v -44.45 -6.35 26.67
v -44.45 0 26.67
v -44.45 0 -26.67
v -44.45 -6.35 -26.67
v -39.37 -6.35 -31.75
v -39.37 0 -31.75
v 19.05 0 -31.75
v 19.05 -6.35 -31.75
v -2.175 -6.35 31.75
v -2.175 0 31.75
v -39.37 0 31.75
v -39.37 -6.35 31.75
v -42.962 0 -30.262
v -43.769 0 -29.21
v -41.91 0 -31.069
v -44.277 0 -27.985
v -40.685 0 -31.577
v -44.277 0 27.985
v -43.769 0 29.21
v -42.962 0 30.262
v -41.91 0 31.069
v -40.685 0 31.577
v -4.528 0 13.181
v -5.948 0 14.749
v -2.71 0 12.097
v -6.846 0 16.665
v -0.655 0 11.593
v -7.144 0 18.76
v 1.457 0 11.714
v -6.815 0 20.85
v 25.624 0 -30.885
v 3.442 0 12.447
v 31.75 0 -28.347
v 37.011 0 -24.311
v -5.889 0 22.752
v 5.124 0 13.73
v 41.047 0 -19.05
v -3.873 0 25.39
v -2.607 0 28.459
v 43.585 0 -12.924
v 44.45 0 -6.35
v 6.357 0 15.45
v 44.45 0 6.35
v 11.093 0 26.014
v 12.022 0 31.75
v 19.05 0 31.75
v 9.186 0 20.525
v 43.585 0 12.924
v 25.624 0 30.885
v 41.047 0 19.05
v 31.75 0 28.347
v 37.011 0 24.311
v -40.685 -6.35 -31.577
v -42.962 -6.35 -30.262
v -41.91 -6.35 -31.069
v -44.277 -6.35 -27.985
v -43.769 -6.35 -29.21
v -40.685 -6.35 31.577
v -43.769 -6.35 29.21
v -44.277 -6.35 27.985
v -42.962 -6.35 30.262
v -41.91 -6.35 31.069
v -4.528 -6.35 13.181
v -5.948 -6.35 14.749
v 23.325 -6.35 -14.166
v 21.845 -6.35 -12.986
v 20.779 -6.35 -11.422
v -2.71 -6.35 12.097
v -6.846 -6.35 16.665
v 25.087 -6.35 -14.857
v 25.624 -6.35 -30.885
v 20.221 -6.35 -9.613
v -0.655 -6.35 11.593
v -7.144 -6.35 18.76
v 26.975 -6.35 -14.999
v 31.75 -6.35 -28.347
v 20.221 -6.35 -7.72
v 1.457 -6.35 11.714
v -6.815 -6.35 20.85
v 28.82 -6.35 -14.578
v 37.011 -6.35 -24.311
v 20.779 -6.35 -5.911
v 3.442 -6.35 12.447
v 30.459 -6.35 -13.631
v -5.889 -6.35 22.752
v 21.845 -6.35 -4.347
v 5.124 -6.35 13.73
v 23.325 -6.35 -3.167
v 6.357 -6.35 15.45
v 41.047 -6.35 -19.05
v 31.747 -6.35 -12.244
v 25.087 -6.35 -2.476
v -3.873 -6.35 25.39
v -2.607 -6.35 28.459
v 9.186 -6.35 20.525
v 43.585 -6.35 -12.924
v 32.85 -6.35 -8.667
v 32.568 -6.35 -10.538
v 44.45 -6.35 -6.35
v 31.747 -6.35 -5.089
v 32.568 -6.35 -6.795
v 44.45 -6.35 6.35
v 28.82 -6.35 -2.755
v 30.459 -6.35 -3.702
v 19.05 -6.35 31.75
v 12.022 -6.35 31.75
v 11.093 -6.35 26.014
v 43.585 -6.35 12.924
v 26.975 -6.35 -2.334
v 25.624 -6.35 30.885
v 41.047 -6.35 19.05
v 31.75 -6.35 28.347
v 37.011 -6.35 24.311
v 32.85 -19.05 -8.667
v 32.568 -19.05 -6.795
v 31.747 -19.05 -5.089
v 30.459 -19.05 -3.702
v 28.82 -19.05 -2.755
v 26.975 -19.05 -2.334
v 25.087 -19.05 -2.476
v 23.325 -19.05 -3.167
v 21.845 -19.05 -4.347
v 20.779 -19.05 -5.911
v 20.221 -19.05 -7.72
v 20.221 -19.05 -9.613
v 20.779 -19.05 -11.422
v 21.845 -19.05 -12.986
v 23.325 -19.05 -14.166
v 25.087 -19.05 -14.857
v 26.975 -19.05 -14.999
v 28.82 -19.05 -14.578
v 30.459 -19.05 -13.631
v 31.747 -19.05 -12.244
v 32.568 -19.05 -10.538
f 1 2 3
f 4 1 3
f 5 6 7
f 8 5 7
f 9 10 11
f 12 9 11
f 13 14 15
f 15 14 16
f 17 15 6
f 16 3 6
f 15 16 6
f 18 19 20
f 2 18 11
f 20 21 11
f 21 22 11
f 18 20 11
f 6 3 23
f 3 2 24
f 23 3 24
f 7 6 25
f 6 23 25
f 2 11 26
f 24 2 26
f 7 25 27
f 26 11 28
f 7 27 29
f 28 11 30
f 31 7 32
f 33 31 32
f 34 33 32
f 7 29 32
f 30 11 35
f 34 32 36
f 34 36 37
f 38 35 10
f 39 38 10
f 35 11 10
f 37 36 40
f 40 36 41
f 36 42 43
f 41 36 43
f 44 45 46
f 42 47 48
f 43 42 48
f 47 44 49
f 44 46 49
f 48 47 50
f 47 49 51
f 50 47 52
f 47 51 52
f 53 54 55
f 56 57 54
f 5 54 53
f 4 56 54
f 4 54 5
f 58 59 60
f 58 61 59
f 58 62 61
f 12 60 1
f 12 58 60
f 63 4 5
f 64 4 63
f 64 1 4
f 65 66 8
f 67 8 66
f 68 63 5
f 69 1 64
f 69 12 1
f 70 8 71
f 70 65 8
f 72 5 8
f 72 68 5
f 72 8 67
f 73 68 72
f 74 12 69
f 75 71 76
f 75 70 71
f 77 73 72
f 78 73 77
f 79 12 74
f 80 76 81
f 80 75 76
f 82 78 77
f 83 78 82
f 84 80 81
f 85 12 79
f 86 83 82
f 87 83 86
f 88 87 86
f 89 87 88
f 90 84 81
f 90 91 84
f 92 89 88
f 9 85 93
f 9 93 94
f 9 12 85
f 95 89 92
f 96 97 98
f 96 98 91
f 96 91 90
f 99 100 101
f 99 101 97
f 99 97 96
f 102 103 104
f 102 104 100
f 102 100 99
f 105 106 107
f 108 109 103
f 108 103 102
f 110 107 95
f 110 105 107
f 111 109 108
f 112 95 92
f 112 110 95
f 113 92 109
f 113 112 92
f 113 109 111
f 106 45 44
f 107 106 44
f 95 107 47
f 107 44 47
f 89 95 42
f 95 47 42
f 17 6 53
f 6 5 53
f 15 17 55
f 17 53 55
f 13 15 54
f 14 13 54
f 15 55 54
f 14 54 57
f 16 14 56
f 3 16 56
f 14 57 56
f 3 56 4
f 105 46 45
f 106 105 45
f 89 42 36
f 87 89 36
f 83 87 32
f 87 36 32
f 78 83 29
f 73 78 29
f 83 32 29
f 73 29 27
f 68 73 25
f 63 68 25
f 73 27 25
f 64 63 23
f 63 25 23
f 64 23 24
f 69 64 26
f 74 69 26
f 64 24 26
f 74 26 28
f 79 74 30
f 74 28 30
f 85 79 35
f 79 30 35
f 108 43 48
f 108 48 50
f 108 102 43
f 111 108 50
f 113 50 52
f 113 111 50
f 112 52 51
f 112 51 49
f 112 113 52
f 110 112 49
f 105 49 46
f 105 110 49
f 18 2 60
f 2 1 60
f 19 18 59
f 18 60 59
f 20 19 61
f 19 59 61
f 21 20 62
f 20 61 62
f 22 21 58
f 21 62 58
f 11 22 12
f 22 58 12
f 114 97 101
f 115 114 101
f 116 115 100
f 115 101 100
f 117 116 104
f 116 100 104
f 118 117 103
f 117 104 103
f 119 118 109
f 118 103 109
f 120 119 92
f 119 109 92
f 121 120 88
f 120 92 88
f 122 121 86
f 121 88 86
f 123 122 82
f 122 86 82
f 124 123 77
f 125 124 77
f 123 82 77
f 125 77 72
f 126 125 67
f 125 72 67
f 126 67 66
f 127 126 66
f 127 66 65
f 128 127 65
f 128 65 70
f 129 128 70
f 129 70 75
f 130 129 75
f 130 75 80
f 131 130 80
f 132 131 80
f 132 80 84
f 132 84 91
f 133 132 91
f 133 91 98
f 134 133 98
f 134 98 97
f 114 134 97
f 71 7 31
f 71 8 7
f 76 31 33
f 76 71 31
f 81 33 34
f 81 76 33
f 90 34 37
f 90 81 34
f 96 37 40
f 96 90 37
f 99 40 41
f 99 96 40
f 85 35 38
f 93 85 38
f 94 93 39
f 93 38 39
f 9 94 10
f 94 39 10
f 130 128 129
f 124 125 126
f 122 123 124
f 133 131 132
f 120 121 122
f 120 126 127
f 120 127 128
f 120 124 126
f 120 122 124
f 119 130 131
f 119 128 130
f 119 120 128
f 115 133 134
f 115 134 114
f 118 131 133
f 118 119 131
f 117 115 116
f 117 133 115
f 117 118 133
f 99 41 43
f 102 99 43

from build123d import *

# Parameters (mm, degrees)
F0_R     = 6.35
F1_DEPTH = 6.35
F2_R     = 25.4
F3_R     = 5.08
F4_DEPTH = 19.05


with BuildPart() as f1:
    # F0 (on Front) → F1 (new body)
    with BuildSketch(Plane.XZ):
        with BuildLine():
            Line((-44.45, -31.75), (44.45, -31.75))
            Line((44.45, -31.75), (44.45, 31.75))
            Line((44.45, 31.75), (12.022284, 31.75))
            ThreePointArc((12.022284, 31.75), (10.258949, 23.22823), (6.357251, 15.449627))
            ThreePointArc((6.357251, 15.449627), (-3.659439, 12.571452), (-5.888707, 22.752234))
            ThreePointArc((-5.888707, 22.752234), (-3.139666, 26.882916), (-2.174649, 31.75))
            Line((-2.174649, 31.75), (-44.45, 31.75))
            Line((-44.45, 31.75), (-44.45, -31.75))
        make_face()
        with Locations((26.500253, -8.66654)):
            Circle(F0_R, mode=Mode.SUBTRACT)
        with Locations((26.500253, -8.66654)):
            Circle(F0_R)
    extrude(amount=F1_DEPTH)

    # F2
    f2_edges = [f1.edges().sort_by_distance(p)[0] for p in [
        (44.45, -3.175, -31.75),
        (44.45, -3.175, 31.75),
    ]]
    fillet(f2_edges, radius=F2_R)

    # F3
    f3_edges = [f1.edges().sort_by_distance(p)[0] for p in [
        (-44.45, -3.175, 31.75),
        (-44.45, -3.175, -31.75),
    ]]
    fillet(f3_edges, radius=F3_R)

    # F0 (on Front) → F4 (join)
    with BuildSketch(Plane.XZ):
        with Locations((26.500253, -8.66654)):
            Circle(F0_R)
    extrude(amount=F4_DEPTH)


solid = f1.part
